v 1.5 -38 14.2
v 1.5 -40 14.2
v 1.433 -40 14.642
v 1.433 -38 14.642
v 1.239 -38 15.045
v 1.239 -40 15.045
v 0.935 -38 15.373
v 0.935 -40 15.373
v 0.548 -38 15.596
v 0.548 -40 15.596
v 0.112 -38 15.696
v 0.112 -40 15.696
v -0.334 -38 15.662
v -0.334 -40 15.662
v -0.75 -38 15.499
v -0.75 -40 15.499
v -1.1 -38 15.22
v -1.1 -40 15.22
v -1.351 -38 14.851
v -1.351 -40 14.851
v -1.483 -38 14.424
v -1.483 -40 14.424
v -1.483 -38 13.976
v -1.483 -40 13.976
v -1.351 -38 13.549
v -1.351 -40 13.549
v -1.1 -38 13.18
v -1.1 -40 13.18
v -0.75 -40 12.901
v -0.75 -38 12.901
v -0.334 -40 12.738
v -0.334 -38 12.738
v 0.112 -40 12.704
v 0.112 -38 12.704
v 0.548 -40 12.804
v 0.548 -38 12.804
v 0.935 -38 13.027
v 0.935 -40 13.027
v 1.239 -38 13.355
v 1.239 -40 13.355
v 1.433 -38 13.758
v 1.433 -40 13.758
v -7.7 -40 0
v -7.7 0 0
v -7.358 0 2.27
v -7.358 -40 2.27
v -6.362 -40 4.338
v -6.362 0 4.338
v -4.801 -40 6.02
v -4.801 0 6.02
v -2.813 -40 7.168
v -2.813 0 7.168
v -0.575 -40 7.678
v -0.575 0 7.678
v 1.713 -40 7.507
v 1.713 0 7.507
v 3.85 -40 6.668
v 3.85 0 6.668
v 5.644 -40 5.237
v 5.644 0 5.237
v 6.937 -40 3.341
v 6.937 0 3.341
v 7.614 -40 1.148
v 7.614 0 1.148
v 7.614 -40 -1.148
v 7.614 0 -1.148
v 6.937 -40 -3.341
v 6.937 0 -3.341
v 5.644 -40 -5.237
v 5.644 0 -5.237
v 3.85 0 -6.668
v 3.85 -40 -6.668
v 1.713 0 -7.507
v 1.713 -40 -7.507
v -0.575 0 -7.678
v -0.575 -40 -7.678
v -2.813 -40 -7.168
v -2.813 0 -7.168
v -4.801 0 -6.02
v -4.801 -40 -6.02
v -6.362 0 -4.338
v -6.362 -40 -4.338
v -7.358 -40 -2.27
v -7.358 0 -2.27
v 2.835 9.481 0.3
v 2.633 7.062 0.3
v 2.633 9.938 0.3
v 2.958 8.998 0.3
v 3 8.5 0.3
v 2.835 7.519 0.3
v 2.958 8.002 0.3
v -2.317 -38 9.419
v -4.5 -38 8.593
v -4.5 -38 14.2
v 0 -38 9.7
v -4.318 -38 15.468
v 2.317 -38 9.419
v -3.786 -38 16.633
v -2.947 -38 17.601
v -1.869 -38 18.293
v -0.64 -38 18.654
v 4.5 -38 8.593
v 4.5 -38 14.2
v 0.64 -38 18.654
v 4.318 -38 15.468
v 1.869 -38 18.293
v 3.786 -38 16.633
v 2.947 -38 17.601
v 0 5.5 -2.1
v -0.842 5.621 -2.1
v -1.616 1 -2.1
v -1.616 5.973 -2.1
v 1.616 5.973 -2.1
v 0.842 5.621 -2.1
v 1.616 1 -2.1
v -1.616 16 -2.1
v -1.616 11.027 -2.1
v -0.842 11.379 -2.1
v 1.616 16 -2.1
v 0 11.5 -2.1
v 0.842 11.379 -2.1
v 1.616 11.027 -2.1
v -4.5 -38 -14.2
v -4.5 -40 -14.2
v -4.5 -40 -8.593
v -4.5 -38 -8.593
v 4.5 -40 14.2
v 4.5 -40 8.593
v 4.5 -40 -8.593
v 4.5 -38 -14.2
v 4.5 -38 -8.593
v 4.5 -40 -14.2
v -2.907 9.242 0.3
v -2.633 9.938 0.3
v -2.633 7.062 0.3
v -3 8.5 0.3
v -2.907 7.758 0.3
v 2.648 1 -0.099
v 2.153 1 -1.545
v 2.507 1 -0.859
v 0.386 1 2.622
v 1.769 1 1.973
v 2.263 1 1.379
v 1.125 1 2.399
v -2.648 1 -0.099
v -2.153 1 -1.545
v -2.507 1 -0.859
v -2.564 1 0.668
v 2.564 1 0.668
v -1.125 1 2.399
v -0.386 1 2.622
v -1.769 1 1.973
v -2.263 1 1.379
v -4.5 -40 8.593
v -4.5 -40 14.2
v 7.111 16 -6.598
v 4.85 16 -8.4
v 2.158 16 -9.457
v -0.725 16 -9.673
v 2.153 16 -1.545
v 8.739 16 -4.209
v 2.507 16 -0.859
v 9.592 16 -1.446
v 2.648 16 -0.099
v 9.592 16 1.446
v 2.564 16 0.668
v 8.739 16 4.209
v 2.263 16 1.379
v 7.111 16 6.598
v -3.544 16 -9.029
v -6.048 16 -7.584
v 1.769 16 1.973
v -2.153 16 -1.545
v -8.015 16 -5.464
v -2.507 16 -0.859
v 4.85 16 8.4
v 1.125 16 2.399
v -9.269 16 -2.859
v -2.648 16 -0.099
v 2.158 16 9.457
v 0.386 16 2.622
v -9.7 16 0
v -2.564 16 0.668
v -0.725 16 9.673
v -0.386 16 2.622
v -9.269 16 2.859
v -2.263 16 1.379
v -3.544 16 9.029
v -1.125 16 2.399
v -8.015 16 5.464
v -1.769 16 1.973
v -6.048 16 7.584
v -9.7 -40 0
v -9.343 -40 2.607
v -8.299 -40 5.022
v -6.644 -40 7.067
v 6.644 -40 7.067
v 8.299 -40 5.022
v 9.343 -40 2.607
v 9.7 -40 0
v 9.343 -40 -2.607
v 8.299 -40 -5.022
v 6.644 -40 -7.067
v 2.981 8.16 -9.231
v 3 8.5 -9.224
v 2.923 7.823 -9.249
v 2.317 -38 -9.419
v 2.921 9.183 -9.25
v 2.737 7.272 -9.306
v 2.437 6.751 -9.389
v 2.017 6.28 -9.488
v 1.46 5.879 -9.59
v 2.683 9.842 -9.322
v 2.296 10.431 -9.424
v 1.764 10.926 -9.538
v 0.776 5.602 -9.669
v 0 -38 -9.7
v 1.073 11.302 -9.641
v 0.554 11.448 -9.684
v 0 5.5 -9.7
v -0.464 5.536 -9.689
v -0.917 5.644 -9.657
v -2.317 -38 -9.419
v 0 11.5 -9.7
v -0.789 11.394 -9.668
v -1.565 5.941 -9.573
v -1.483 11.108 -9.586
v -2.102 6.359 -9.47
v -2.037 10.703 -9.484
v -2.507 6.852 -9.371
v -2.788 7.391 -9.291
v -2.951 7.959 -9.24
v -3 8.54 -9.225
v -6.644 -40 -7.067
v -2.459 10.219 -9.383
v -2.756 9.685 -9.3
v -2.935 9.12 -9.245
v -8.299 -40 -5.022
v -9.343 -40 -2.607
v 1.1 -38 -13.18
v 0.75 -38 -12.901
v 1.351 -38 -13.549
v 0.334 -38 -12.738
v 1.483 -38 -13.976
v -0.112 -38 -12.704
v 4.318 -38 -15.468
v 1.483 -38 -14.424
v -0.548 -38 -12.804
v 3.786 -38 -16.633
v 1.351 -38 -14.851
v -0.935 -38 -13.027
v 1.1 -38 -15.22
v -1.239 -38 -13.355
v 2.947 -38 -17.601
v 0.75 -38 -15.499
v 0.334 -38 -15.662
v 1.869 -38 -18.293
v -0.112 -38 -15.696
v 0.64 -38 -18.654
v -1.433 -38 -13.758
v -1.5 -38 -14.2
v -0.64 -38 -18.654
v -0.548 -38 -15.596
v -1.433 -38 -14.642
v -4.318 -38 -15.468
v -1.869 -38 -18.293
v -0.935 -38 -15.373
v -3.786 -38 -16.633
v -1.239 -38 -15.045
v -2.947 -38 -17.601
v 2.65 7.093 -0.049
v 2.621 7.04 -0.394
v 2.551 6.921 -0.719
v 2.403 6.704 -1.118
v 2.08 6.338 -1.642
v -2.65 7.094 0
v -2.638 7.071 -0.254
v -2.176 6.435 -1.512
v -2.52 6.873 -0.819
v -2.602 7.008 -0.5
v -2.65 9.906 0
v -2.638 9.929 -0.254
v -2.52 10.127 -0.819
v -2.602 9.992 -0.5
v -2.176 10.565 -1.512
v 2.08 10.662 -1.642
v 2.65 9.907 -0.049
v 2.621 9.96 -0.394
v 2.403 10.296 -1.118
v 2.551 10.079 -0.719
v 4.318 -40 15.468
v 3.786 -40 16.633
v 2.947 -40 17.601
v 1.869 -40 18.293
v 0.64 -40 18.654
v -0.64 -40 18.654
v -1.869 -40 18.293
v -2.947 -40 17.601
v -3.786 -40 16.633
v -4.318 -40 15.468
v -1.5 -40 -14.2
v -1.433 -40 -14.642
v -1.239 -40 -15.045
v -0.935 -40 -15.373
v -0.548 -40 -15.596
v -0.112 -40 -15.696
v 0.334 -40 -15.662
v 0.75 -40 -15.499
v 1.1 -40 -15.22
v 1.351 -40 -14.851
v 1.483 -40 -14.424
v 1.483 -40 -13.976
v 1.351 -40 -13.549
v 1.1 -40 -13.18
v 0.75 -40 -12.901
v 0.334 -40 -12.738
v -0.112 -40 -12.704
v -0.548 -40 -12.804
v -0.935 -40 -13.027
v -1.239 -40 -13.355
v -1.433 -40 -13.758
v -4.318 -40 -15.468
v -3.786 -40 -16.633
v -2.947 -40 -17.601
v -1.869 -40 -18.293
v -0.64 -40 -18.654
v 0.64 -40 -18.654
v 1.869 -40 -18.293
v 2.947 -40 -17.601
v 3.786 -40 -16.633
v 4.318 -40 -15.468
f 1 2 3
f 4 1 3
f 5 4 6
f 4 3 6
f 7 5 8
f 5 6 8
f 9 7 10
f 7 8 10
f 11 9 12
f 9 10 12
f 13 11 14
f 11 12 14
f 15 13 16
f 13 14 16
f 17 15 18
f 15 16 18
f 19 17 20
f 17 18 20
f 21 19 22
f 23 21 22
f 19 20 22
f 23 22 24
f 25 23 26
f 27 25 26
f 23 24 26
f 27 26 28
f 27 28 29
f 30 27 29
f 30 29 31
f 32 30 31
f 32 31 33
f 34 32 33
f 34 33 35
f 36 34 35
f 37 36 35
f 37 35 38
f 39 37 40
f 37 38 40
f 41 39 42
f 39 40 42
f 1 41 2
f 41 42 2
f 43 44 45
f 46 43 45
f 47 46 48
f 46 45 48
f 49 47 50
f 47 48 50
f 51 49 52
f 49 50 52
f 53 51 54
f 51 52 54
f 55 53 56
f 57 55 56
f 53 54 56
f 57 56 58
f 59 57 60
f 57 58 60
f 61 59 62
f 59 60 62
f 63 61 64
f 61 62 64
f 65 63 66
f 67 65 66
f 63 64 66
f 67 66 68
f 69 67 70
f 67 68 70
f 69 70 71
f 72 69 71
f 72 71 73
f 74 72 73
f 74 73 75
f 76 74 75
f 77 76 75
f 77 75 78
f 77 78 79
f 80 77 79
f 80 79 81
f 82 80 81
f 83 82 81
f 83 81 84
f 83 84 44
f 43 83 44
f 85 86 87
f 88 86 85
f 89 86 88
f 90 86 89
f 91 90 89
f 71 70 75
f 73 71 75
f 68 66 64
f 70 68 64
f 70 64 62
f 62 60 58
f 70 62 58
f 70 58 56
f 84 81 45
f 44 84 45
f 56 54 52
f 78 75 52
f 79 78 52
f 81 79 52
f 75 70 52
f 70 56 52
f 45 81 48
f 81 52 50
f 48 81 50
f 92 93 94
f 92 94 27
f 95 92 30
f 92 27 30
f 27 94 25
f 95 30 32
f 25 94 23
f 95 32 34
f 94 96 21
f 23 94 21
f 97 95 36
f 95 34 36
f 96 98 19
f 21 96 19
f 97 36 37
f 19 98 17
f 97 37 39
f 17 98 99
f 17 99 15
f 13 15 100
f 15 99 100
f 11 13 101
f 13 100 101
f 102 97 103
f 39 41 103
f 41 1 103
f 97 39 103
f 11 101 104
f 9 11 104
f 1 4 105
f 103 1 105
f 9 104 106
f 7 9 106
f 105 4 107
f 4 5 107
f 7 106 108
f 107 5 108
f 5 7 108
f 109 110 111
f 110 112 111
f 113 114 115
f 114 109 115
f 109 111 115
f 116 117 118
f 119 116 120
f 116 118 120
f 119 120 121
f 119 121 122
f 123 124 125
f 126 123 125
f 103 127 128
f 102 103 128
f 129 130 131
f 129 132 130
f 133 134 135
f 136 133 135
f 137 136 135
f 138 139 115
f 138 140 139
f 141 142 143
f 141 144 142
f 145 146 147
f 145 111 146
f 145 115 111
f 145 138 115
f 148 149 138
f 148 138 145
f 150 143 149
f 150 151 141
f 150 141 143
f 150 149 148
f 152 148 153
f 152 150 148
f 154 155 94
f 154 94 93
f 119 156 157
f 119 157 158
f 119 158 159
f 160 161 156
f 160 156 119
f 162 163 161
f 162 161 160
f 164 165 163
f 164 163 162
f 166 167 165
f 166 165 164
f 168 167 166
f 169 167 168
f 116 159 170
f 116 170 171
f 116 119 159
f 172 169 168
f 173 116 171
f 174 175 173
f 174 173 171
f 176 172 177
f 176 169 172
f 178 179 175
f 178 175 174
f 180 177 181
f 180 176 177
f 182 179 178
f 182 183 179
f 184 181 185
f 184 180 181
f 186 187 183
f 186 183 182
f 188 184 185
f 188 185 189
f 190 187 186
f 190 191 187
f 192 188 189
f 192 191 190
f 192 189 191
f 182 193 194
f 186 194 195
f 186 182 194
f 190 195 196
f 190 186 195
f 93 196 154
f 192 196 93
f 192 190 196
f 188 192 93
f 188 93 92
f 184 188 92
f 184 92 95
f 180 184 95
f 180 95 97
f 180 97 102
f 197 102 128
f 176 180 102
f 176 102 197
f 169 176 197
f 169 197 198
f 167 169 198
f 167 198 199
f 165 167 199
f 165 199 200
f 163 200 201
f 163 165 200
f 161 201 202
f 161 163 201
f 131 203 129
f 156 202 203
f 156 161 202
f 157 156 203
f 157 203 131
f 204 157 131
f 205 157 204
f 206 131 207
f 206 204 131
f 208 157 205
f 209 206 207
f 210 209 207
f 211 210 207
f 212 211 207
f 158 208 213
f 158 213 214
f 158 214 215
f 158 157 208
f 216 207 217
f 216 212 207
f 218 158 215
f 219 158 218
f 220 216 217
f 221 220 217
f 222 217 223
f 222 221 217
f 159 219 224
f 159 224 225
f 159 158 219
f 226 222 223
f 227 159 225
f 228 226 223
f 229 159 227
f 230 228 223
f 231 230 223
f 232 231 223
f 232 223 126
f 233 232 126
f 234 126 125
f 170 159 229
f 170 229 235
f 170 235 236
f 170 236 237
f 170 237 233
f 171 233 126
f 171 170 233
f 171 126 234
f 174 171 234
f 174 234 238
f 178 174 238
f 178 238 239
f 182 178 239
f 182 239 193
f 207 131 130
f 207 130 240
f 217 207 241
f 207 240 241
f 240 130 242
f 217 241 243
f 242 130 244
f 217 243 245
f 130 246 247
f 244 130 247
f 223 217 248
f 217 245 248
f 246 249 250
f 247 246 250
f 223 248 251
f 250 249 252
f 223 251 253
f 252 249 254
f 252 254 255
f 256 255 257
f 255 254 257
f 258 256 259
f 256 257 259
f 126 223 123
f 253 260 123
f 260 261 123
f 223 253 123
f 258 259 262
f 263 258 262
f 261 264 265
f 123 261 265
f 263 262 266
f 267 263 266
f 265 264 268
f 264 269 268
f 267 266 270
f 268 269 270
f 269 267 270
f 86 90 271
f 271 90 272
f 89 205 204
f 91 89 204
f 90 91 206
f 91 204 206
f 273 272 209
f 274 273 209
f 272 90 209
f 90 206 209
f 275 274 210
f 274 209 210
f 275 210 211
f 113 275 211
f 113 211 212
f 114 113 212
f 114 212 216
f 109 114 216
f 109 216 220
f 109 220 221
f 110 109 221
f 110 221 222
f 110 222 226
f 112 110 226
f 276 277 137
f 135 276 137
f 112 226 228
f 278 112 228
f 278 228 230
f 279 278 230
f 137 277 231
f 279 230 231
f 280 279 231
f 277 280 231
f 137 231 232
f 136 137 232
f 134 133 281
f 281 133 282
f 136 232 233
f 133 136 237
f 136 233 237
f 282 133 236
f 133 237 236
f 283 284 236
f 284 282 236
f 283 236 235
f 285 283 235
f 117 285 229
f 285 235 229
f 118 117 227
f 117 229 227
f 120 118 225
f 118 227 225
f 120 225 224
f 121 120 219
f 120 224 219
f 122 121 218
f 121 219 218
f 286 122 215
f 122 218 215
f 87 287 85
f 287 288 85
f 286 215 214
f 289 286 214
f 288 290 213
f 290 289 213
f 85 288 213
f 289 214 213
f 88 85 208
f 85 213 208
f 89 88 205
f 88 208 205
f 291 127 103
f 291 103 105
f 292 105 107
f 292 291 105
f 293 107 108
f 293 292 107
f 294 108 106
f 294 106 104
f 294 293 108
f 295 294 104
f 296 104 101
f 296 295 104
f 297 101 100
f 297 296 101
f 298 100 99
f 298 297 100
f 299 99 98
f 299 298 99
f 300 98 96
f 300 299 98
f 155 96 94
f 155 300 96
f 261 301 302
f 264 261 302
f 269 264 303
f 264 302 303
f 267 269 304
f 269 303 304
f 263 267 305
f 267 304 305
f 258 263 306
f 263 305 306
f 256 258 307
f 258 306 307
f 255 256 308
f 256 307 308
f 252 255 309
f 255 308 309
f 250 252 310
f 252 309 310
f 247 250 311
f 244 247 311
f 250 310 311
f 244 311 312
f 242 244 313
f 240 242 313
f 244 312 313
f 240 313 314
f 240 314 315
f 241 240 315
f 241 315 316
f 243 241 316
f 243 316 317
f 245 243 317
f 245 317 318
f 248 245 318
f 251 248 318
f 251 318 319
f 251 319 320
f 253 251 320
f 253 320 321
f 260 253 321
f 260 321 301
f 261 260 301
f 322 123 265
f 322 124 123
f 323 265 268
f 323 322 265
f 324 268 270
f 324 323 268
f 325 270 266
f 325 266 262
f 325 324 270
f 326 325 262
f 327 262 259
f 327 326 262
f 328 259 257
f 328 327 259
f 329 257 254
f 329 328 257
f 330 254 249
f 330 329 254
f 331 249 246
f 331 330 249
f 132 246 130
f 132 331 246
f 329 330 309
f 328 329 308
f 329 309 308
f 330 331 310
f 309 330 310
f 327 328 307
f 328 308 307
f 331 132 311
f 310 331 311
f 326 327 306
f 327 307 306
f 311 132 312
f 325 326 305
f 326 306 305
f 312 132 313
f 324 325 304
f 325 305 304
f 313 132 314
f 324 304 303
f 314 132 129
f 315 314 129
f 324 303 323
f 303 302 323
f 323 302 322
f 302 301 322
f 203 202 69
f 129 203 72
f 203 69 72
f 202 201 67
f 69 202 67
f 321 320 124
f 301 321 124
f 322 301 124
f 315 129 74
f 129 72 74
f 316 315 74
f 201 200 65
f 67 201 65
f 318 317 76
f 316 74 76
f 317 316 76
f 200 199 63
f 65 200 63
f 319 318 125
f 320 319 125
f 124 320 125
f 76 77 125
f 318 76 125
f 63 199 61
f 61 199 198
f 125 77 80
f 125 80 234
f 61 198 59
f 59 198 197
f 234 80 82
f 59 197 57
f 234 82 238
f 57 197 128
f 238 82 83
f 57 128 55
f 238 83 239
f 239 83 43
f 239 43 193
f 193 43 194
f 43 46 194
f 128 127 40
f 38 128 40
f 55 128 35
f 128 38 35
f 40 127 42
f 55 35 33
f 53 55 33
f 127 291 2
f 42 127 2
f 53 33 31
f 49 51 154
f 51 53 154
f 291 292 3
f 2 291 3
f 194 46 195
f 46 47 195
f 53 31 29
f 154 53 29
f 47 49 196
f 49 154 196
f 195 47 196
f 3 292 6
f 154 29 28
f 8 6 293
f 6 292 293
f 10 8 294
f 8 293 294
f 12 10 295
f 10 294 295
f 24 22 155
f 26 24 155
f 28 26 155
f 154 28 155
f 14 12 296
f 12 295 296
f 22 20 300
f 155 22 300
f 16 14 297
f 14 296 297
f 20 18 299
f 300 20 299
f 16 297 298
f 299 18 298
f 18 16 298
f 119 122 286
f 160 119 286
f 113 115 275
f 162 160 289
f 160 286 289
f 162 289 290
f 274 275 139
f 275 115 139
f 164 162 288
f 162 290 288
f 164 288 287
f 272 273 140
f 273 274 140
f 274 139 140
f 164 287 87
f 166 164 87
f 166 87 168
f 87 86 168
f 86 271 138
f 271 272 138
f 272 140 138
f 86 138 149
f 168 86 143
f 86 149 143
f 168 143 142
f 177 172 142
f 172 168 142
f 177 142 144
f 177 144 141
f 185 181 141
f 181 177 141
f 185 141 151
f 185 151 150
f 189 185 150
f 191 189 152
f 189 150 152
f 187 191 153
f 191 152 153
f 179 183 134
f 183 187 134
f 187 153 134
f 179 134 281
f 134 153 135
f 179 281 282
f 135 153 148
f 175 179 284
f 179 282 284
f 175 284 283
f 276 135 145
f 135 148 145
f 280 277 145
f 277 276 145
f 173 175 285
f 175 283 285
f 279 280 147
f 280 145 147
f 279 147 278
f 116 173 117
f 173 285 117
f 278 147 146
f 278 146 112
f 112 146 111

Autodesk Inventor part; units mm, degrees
ref_plane "YZ Plane" through (0, 0, 0) normal (1, 0, 0) x (0, 1, 0)
ref_plane "XZ Plane" through (0, 0, 0) normal (0, 1, 0) x (-1, 0, 0)
sketch "Sketch1" plane through (0, 0, 0) normal (0, 1, 0) x (-1, 0, 0)
  line L0 (0, 0) -> (4.8, 0) construction
  circle A0 centre (0, 0) radius 2.5 construction
  circle A1 centre (0, 0) radius 2.65
  line L1 (0.0078, 2.5) -> (0.0078, -2.1) construction
  line L2 (0.0078, 2.5) -> (4.6078, 2.5) construction
  line L3 (0.0078, -2.1) -> (1.6163, -2.1)
  line L4 (0.0078, -2.1) -> (-1.6163, -2.1)
  line L5 (0.0078, -2.1) -> (1.6319, -2.1) construction
  circle A2 centre (0, 0) radius 7.5 construction
  circle A3 centre (0, 0) radius 7.7
  circle A4 centre (0, 0) radius 9.7
  dimension "d5" = 5
  dimension "d6" = 0.15
  dimension "d7" = 4.6
  dimension "d8" = 90
  dimension "d9" = 90
  dimension "d10" = 180
  dimension "d26" = 15
  dimension "d27" = 0.2
  dimension "d28" = 2
extrude "Extrusion5" add sketch "Sketch1" along normal blind 16 contours L4 L3 A1 | A3 | A4 picked at (-0.9103, -2.2002)
extrude "Extrusion6" add sketch "Sketch1" along normal blind 1 contours A1 L3 L4 picked at (0.0374, 1.0538)
extrude "Extrusion7" add sketch "Sketch1" against normal blind 40 contours A4
ref_plane "Work Plane1" through (0, 0, -9.7) normal (0, 0, 1) x (1, 0, 0)
sketch "Sketch3" plane through (0, 0, -9.7) normal (0, 0, 1) x (1, 0, 0)
  circle A0 centre (0, 8.5) radius 1.5
  circle A1 centre (0, 8.5) radius 3
  point P0 (0, 0)
  dimension "d35" = 3
  dimension "d36" = 6
extrude "Extrusion8" cut sketch "Sketch3" along normal blind 7.7 contours A0
extrude "Extrusion9" cut sketch "Sketch3" along normal blind 10
sketch "Sketch4" plane through (0, -40, 0) normal (0, -1, 0) x (1, 0, 0)
  circle A0 centre (0, 0) radius 9.7 projected
  circle A1 centre (0, 14.2) radius 1.5
  line L0 (0, 12.7) -> (0, 9.7) construction
  circle A2 centre (0, 14.2) radius 4.5
  line L1 (4.5, 14.2) -> (4.5, 8.593)
  line L2 (-4.5, 14.2) -> (-4.5, 8.593)
  circle A3 centre (0, 0) radius 9.7 projected
  dimension "d42" = 3
  dimension "d43" = 3
  dimension "d44" = 3
extrude "Extrusion10" add sketch "Sketch4" against normal blind 2 contours A0 A2 L1 | L2 A2 A0 | A2
pattern_circular "Circular Pattern1" count 2 over 360 about axis through (0, 0, 0) along (0, -1, 0) of "Extrusion10"
properties part number "Arm"
